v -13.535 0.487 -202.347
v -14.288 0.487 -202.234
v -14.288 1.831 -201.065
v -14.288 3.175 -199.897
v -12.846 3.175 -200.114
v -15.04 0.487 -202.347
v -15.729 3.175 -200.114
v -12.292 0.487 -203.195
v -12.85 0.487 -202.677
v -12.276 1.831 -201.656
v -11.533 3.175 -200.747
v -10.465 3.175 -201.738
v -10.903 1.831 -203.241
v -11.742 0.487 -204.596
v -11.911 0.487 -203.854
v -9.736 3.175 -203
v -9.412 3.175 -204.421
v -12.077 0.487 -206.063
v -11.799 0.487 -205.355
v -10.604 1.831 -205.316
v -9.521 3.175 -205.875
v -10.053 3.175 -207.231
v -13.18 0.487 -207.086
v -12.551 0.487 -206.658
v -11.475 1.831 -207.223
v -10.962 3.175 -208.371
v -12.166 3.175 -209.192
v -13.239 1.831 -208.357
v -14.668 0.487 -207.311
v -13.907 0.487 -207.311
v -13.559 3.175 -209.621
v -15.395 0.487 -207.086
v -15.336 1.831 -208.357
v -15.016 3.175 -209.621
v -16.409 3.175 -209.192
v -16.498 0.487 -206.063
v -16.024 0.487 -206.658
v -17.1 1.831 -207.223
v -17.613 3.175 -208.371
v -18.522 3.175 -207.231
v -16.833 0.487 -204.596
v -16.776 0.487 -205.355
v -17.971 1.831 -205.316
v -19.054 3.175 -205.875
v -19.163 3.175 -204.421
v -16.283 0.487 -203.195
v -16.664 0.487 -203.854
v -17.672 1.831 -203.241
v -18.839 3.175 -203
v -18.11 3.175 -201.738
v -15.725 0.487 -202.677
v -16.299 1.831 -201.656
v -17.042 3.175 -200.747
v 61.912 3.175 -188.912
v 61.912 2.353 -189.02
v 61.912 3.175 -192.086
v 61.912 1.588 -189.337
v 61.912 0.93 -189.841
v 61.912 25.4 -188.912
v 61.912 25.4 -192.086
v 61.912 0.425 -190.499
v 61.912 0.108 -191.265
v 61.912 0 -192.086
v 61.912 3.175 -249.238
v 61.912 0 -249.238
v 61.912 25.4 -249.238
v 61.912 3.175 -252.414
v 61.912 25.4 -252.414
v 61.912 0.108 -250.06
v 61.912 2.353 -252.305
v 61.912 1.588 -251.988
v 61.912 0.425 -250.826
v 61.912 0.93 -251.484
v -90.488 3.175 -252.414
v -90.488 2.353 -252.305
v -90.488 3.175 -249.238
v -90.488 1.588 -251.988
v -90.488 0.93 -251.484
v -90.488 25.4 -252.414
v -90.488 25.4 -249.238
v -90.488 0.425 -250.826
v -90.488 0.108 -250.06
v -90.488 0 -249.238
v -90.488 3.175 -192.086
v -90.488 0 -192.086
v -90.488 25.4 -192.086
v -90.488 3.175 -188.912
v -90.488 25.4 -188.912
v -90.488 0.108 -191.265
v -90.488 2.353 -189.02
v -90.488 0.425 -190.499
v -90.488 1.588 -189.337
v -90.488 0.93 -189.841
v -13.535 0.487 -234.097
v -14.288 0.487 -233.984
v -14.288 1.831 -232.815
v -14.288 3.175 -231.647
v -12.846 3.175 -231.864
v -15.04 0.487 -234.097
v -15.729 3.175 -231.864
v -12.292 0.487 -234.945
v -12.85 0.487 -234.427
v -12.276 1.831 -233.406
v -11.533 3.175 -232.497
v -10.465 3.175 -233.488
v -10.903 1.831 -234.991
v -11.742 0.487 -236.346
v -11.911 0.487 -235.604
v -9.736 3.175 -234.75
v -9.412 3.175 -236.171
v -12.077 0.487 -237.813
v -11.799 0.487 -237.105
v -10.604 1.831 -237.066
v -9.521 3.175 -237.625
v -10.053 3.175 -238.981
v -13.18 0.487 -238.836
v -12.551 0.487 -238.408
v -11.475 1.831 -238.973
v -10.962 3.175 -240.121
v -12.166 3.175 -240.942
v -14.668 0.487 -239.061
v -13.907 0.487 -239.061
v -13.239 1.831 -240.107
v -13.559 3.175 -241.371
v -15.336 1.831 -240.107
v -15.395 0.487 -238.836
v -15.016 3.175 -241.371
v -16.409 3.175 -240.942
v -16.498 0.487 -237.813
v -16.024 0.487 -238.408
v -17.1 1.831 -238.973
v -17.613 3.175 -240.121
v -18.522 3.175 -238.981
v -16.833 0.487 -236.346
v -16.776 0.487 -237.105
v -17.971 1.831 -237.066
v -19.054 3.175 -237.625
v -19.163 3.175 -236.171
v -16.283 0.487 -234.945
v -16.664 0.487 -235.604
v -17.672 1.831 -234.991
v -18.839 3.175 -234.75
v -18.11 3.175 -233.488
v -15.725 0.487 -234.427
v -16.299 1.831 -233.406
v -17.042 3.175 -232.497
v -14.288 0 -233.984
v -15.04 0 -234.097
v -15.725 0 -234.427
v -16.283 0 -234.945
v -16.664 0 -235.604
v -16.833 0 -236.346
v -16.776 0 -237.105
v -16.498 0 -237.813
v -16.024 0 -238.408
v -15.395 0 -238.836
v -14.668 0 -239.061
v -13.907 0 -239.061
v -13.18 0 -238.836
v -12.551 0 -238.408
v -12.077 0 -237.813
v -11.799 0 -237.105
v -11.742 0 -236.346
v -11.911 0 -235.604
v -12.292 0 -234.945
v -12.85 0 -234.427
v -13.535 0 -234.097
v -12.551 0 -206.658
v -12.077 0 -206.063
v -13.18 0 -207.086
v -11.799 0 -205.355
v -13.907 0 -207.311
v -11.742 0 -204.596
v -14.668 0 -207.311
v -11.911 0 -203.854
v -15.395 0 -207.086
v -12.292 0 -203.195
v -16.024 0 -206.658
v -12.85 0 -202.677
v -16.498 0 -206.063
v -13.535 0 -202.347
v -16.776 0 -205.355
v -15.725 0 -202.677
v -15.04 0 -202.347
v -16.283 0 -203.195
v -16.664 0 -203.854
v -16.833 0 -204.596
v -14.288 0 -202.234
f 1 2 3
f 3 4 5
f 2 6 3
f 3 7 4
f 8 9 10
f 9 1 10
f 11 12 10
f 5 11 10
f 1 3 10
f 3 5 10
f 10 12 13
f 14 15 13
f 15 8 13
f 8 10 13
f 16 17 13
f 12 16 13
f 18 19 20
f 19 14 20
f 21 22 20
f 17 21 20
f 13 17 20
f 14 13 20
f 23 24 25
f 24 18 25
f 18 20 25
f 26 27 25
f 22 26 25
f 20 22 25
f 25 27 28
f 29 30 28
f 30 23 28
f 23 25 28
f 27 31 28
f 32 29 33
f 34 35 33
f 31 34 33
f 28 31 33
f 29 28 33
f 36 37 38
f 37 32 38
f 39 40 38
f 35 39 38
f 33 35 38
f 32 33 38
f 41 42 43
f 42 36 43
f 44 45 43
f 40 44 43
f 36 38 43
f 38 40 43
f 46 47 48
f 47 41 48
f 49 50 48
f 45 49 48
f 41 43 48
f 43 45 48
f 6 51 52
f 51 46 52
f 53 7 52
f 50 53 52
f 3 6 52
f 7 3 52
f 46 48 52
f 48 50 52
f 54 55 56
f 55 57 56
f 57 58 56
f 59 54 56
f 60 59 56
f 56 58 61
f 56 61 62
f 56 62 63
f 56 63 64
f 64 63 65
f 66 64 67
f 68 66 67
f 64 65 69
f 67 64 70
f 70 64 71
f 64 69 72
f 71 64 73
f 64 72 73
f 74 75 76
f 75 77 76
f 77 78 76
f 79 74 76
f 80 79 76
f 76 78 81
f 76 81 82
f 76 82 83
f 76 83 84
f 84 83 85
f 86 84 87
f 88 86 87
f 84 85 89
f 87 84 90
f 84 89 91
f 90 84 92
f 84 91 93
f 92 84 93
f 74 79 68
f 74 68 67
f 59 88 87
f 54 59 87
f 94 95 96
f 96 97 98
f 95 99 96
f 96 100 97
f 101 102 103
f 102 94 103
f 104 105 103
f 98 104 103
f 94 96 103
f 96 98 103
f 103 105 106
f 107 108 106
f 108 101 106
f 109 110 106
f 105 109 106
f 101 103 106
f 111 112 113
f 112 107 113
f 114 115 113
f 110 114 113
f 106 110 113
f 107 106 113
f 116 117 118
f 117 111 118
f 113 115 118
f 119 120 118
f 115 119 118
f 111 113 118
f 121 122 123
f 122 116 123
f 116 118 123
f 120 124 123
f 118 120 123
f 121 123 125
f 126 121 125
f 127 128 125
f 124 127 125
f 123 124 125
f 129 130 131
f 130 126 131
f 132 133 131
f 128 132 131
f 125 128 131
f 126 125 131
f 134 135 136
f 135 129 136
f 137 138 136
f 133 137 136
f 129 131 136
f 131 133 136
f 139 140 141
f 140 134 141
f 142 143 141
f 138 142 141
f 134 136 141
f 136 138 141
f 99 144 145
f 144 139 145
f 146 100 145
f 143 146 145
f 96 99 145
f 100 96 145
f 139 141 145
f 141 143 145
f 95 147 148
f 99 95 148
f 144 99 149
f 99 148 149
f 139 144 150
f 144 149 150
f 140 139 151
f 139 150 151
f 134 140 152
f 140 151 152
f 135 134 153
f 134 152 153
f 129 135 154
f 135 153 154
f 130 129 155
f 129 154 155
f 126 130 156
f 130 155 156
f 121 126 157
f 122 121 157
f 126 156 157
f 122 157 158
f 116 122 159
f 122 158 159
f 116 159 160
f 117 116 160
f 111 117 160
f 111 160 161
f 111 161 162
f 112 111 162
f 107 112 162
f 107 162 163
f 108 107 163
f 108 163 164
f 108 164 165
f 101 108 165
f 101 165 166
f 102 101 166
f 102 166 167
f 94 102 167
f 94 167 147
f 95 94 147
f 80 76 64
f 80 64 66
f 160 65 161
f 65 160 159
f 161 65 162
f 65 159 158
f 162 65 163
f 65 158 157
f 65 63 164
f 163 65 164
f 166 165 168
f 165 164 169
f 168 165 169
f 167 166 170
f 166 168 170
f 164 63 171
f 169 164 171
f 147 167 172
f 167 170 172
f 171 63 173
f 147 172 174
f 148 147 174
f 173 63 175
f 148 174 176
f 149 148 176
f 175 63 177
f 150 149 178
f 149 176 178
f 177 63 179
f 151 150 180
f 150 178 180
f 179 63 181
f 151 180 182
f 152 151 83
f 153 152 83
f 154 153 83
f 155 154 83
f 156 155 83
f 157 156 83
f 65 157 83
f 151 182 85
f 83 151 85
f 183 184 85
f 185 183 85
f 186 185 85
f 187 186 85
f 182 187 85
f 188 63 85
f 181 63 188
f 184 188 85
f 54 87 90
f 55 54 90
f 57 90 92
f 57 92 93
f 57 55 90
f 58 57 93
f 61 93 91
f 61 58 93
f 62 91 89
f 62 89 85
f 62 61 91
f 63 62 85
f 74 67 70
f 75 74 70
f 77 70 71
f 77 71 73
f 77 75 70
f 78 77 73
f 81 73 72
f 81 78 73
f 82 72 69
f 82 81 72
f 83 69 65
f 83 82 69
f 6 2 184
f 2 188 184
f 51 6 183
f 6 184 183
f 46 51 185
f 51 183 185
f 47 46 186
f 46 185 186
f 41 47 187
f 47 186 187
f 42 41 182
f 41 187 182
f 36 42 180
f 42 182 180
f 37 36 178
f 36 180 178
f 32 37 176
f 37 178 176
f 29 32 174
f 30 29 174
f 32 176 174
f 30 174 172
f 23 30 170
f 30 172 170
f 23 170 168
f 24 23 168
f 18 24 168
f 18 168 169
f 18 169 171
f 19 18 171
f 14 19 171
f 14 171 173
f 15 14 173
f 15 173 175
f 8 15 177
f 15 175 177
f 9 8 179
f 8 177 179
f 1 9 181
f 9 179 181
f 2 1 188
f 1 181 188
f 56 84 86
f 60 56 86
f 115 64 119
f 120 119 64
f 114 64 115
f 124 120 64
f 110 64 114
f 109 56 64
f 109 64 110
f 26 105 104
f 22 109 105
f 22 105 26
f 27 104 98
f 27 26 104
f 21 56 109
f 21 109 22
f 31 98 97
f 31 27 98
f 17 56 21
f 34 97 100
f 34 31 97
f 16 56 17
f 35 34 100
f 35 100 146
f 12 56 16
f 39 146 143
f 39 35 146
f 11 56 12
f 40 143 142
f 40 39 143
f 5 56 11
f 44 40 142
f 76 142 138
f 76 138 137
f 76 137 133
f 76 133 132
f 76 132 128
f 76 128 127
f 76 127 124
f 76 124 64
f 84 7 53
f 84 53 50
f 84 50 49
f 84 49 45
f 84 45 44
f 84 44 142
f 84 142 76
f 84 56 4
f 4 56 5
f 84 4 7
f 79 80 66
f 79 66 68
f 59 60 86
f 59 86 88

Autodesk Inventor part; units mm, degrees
ref_plane "YZ Plane" through (0, 0, 0) normal (1, 0, 0) x (0, 1, 0)
ref_plane "XZ Plane" through (0, 0, 0) normal (0, 1, 0) x (-1, 0, 0)
ref_plane "XY Plane" through (0, 0, 0) normal (0, 0, 1) x (1, 0, 0)
sketch "Sketch2" plane through (0, 0, 0) normal (0, 1, 0) x (-1, 0, 0)
  line L0 (90.4875, -192.0875) -> (-61.9125, -192.0875)
  line L1 (-61.9125, -192.0875) -> (-61.9125, -249.2375)
  line L2 (-61.9125, -249.2375) -> (90.4875, -249.2375)
  line L3 (90.4875, -249.2375) -> (90.4875, -192.0875)
  dimension "d5" = 152.4
  dimension "d6" = 57.15
extrude "Plate1" add sketch "Sketch2" along normal blind 3.175
sketch "Sketch3" plane through (61.9125, 3.176, -192.0865) normal (0, 0, 1) x (1, 0, 0)
  line L0 (-152.4, 0) -> (0, 0)
  line L1 (0, 0) -> (0, 22.224)
  line L2 (0, 22.224) -> (-152.4, 22.224)
  line L3 (-152.4, 22.224) -> (-152.4, 0)
edge flange "Flange1" height 25.4 angle 90 thickness 3.175 bend radius 0 thickness toward (0, 0, 1) relief tear relief width 3.175 relief depth 1.5875 corner gap 3.175 corner form 0 edges at (-14.2875, 3.175, -192.0875) (-14.2875, 3.175, -249.2375) wall of the first edge with corners at (-90.4875, 3.176, -192.0865) (61.9125, 3.176, -192.0865) (61.9125, 25.4, -192.0865) (-90.4875, 25.4, -192.0865)
bend "Bend1"
corner "Corner1"
sketch "Sketch4" plane through (0, 3.175, 0) normal (0, 1, 0) x (1, 0, 0)
  line L0 (-14.2875, 204.7865) -> (-14.2875, 236.5365) construction
  line L1 (-90.4875, 188.9115) -> (61.9125, 188.9115) construction
  line L2 (-90.4875, 192.0875) -> (-90.4875, 249.2375) construction
  point P0 (0, 0)
  dimension "d20" = 31.75
  dimension "d21" = 15.875
  dimension "d22" = 76.2
hole "Hole1" at (-14.2875, 3.175, -204.7865) at (-14.2875, 3.175, -236.5365) direction (0, -1, 0) diameter 5.1054 end through all countersink diameter 9.779 countersink angle 82 clearance for "Flat Head Machine Screw (82)" size "#10" standard "Ansi Unified Screw Threads"
equation "\"d10\" = BendReliefWidth"
equation "\"d11\" = BendReliefDepth"
equation "\"d12\" = MinimumRemnant"
equation "\"d13\" = BendRadius"
equation "\"d17\" = CornerReliefSize"
equation "\"d18\" = GapSize"
equation "\"d19\" = JacobiRadiusSize"
equation "\"BendRadius\" = Thickness"
equation "\"BendReliefWidth\" = Thickness"
equation "\"BendReliefDepth\" = 0.5 * Thickness"
equation "\"CornerReliefSize\" = 4 * Thickness"
equation "\"MinimumRemnant\" = 2 * Thickness"
equation "\"TransitionRadius\" = BendRadius"
equation "\"JacobiRadiusSize\" = BendRadius"
equation "\"GapSize\" = Thickness"
equation "\"d9\" = BendRadius"
equation "\"Thickness\" = 3.175"
properties part number "uchannel"
